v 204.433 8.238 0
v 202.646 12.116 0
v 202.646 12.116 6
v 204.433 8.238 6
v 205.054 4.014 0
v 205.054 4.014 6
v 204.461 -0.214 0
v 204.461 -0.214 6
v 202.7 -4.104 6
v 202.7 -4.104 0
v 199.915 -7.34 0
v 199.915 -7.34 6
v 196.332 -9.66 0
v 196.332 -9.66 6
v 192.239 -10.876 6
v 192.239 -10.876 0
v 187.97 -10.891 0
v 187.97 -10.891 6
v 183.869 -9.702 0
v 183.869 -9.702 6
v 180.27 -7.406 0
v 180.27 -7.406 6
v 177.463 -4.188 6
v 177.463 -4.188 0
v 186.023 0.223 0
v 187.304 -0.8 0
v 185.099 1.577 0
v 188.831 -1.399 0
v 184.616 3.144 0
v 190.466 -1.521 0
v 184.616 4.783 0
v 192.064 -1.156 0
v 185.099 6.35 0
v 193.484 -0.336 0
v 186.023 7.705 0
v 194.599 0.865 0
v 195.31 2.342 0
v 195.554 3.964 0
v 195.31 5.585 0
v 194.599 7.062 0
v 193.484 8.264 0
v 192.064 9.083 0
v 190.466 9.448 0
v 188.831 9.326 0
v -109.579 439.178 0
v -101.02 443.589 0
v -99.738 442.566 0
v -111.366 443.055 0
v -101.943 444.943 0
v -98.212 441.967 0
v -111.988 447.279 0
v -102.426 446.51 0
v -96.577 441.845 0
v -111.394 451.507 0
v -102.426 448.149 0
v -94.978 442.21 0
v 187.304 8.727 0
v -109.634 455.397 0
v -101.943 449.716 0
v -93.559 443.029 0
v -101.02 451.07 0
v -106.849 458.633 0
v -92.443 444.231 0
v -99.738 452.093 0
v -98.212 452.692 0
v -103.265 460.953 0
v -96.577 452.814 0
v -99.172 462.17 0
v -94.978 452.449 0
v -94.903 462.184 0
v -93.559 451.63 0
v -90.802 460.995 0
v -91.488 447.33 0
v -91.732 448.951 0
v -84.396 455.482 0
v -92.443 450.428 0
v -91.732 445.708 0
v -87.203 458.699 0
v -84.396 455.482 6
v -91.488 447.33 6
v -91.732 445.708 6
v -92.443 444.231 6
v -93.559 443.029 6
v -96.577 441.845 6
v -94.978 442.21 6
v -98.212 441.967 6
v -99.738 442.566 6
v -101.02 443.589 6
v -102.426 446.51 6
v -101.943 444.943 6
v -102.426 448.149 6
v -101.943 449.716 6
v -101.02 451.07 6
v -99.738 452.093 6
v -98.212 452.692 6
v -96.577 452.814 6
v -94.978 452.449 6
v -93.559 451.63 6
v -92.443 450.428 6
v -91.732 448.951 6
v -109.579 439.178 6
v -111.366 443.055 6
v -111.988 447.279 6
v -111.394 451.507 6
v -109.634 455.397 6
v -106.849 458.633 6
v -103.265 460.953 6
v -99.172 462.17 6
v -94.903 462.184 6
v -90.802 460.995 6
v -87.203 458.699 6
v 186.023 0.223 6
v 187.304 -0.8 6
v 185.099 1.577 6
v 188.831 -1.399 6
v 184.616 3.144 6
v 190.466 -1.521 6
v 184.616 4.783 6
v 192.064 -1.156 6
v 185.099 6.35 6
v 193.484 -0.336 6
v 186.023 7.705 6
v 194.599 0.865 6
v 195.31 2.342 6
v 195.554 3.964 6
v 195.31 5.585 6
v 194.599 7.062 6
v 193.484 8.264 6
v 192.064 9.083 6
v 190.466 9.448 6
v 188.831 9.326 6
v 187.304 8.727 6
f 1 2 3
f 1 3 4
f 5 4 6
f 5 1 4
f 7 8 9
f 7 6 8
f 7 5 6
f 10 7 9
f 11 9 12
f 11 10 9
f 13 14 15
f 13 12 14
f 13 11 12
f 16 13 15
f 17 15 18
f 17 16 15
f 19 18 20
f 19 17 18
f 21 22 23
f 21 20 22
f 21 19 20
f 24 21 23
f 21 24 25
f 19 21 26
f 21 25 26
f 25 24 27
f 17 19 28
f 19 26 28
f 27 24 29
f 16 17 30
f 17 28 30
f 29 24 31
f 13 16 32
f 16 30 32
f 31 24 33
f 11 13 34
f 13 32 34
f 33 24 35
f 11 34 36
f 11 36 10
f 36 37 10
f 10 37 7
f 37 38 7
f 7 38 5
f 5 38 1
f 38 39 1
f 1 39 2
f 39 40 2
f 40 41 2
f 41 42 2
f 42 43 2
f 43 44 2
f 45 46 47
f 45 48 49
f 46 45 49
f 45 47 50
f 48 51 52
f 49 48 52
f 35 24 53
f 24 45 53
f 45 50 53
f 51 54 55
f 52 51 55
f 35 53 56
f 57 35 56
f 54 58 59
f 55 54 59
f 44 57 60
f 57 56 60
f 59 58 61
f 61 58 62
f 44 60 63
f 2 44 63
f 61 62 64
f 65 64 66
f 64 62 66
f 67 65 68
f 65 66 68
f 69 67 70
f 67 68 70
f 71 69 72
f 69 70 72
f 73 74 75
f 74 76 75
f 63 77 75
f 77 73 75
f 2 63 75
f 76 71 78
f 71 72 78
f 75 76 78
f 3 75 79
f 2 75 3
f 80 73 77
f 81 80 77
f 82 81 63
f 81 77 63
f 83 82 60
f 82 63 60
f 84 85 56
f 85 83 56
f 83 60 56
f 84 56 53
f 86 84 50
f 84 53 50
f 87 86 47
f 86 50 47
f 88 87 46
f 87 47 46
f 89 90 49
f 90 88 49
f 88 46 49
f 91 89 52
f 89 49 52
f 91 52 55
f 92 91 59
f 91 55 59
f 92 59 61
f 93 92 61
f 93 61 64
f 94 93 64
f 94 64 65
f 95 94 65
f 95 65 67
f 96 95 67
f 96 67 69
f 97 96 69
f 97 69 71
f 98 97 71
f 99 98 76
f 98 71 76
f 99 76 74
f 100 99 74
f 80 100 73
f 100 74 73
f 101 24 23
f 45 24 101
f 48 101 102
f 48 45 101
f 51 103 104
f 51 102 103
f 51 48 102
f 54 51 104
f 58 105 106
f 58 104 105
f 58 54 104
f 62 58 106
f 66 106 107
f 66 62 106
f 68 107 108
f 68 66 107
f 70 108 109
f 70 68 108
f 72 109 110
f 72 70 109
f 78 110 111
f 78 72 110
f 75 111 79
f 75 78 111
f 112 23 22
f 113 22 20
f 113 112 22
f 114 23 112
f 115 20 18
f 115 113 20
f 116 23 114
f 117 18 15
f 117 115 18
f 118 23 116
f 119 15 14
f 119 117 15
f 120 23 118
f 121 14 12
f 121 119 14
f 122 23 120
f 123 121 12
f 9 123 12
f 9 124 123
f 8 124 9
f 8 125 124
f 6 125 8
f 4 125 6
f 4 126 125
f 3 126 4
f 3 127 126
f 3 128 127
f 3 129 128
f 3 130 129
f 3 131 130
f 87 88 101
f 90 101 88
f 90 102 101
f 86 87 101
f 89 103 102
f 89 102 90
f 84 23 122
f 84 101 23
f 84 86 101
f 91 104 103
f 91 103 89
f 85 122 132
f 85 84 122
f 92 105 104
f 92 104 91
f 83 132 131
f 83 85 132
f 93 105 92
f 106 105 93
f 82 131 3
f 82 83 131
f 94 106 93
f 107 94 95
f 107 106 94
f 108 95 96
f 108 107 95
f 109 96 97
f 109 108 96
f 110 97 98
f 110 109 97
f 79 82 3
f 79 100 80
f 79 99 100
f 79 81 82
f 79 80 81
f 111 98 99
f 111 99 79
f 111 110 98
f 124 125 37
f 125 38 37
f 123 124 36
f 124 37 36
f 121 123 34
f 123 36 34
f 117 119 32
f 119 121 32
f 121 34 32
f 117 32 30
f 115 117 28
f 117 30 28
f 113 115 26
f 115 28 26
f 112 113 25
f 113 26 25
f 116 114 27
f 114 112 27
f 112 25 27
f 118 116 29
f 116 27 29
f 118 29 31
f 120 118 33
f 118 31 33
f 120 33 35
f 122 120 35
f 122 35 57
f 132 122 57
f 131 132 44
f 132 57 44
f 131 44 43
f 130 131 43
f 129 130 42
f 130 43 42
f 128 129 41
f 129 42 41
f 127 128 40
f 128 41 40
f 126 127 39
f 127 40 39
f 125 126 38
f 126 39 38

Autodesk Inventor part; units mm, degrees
ref_plane "YZ Plane" through (0, 0, 0) normal (1, 0, 0) x (0, 1, 0)
ref_plane "XZ Plane" through (0, 0, 0) normal (0, 1, 0) x (-1, 0, 0)
ref_plane "XY Plane" through (0, 0, 0) normal (0, 0, 1) x (1, 0, 0)
sketch "Sketch1" plane through (0, 0, 0) normal (0, 0, 1) x (1, 0, 0)
  circle A0 centre (190.0545, 3.9636) radius 5.5 projected
  circle A1 centre (-96.9878, 447.3295) radius 5.5 projected
  arc A2 (177.463, -4.1883) -> (202.646, 12.1156) centre (190.0545, 3.9636) ccw
  arc A3 (-84.3963, 455.4815) -> (-109.5793, 439.1776) centre (-96.9878, 447.3295) ccw
  line L0 (-84.3963, 455.4815) -> (202.646, 12.1156)
  line L1 (177.463, -4.1883) -> (-109.5793, 439.1776)
  circle A4 centre (190.0545, 3.9636) radius 5.5
  circle A5 centre (-96.9878, 447.3295) radius 5.5
  point P0 (0, 0)
  dimension "d2" = 30
  dimension "d3" = 30
  dimension "d4" = 11
  dimension "d5" = 11
extrude "Extrusion2" add sketch "Sketch1" along normal blind 6
properties material "Steel, Mild"
